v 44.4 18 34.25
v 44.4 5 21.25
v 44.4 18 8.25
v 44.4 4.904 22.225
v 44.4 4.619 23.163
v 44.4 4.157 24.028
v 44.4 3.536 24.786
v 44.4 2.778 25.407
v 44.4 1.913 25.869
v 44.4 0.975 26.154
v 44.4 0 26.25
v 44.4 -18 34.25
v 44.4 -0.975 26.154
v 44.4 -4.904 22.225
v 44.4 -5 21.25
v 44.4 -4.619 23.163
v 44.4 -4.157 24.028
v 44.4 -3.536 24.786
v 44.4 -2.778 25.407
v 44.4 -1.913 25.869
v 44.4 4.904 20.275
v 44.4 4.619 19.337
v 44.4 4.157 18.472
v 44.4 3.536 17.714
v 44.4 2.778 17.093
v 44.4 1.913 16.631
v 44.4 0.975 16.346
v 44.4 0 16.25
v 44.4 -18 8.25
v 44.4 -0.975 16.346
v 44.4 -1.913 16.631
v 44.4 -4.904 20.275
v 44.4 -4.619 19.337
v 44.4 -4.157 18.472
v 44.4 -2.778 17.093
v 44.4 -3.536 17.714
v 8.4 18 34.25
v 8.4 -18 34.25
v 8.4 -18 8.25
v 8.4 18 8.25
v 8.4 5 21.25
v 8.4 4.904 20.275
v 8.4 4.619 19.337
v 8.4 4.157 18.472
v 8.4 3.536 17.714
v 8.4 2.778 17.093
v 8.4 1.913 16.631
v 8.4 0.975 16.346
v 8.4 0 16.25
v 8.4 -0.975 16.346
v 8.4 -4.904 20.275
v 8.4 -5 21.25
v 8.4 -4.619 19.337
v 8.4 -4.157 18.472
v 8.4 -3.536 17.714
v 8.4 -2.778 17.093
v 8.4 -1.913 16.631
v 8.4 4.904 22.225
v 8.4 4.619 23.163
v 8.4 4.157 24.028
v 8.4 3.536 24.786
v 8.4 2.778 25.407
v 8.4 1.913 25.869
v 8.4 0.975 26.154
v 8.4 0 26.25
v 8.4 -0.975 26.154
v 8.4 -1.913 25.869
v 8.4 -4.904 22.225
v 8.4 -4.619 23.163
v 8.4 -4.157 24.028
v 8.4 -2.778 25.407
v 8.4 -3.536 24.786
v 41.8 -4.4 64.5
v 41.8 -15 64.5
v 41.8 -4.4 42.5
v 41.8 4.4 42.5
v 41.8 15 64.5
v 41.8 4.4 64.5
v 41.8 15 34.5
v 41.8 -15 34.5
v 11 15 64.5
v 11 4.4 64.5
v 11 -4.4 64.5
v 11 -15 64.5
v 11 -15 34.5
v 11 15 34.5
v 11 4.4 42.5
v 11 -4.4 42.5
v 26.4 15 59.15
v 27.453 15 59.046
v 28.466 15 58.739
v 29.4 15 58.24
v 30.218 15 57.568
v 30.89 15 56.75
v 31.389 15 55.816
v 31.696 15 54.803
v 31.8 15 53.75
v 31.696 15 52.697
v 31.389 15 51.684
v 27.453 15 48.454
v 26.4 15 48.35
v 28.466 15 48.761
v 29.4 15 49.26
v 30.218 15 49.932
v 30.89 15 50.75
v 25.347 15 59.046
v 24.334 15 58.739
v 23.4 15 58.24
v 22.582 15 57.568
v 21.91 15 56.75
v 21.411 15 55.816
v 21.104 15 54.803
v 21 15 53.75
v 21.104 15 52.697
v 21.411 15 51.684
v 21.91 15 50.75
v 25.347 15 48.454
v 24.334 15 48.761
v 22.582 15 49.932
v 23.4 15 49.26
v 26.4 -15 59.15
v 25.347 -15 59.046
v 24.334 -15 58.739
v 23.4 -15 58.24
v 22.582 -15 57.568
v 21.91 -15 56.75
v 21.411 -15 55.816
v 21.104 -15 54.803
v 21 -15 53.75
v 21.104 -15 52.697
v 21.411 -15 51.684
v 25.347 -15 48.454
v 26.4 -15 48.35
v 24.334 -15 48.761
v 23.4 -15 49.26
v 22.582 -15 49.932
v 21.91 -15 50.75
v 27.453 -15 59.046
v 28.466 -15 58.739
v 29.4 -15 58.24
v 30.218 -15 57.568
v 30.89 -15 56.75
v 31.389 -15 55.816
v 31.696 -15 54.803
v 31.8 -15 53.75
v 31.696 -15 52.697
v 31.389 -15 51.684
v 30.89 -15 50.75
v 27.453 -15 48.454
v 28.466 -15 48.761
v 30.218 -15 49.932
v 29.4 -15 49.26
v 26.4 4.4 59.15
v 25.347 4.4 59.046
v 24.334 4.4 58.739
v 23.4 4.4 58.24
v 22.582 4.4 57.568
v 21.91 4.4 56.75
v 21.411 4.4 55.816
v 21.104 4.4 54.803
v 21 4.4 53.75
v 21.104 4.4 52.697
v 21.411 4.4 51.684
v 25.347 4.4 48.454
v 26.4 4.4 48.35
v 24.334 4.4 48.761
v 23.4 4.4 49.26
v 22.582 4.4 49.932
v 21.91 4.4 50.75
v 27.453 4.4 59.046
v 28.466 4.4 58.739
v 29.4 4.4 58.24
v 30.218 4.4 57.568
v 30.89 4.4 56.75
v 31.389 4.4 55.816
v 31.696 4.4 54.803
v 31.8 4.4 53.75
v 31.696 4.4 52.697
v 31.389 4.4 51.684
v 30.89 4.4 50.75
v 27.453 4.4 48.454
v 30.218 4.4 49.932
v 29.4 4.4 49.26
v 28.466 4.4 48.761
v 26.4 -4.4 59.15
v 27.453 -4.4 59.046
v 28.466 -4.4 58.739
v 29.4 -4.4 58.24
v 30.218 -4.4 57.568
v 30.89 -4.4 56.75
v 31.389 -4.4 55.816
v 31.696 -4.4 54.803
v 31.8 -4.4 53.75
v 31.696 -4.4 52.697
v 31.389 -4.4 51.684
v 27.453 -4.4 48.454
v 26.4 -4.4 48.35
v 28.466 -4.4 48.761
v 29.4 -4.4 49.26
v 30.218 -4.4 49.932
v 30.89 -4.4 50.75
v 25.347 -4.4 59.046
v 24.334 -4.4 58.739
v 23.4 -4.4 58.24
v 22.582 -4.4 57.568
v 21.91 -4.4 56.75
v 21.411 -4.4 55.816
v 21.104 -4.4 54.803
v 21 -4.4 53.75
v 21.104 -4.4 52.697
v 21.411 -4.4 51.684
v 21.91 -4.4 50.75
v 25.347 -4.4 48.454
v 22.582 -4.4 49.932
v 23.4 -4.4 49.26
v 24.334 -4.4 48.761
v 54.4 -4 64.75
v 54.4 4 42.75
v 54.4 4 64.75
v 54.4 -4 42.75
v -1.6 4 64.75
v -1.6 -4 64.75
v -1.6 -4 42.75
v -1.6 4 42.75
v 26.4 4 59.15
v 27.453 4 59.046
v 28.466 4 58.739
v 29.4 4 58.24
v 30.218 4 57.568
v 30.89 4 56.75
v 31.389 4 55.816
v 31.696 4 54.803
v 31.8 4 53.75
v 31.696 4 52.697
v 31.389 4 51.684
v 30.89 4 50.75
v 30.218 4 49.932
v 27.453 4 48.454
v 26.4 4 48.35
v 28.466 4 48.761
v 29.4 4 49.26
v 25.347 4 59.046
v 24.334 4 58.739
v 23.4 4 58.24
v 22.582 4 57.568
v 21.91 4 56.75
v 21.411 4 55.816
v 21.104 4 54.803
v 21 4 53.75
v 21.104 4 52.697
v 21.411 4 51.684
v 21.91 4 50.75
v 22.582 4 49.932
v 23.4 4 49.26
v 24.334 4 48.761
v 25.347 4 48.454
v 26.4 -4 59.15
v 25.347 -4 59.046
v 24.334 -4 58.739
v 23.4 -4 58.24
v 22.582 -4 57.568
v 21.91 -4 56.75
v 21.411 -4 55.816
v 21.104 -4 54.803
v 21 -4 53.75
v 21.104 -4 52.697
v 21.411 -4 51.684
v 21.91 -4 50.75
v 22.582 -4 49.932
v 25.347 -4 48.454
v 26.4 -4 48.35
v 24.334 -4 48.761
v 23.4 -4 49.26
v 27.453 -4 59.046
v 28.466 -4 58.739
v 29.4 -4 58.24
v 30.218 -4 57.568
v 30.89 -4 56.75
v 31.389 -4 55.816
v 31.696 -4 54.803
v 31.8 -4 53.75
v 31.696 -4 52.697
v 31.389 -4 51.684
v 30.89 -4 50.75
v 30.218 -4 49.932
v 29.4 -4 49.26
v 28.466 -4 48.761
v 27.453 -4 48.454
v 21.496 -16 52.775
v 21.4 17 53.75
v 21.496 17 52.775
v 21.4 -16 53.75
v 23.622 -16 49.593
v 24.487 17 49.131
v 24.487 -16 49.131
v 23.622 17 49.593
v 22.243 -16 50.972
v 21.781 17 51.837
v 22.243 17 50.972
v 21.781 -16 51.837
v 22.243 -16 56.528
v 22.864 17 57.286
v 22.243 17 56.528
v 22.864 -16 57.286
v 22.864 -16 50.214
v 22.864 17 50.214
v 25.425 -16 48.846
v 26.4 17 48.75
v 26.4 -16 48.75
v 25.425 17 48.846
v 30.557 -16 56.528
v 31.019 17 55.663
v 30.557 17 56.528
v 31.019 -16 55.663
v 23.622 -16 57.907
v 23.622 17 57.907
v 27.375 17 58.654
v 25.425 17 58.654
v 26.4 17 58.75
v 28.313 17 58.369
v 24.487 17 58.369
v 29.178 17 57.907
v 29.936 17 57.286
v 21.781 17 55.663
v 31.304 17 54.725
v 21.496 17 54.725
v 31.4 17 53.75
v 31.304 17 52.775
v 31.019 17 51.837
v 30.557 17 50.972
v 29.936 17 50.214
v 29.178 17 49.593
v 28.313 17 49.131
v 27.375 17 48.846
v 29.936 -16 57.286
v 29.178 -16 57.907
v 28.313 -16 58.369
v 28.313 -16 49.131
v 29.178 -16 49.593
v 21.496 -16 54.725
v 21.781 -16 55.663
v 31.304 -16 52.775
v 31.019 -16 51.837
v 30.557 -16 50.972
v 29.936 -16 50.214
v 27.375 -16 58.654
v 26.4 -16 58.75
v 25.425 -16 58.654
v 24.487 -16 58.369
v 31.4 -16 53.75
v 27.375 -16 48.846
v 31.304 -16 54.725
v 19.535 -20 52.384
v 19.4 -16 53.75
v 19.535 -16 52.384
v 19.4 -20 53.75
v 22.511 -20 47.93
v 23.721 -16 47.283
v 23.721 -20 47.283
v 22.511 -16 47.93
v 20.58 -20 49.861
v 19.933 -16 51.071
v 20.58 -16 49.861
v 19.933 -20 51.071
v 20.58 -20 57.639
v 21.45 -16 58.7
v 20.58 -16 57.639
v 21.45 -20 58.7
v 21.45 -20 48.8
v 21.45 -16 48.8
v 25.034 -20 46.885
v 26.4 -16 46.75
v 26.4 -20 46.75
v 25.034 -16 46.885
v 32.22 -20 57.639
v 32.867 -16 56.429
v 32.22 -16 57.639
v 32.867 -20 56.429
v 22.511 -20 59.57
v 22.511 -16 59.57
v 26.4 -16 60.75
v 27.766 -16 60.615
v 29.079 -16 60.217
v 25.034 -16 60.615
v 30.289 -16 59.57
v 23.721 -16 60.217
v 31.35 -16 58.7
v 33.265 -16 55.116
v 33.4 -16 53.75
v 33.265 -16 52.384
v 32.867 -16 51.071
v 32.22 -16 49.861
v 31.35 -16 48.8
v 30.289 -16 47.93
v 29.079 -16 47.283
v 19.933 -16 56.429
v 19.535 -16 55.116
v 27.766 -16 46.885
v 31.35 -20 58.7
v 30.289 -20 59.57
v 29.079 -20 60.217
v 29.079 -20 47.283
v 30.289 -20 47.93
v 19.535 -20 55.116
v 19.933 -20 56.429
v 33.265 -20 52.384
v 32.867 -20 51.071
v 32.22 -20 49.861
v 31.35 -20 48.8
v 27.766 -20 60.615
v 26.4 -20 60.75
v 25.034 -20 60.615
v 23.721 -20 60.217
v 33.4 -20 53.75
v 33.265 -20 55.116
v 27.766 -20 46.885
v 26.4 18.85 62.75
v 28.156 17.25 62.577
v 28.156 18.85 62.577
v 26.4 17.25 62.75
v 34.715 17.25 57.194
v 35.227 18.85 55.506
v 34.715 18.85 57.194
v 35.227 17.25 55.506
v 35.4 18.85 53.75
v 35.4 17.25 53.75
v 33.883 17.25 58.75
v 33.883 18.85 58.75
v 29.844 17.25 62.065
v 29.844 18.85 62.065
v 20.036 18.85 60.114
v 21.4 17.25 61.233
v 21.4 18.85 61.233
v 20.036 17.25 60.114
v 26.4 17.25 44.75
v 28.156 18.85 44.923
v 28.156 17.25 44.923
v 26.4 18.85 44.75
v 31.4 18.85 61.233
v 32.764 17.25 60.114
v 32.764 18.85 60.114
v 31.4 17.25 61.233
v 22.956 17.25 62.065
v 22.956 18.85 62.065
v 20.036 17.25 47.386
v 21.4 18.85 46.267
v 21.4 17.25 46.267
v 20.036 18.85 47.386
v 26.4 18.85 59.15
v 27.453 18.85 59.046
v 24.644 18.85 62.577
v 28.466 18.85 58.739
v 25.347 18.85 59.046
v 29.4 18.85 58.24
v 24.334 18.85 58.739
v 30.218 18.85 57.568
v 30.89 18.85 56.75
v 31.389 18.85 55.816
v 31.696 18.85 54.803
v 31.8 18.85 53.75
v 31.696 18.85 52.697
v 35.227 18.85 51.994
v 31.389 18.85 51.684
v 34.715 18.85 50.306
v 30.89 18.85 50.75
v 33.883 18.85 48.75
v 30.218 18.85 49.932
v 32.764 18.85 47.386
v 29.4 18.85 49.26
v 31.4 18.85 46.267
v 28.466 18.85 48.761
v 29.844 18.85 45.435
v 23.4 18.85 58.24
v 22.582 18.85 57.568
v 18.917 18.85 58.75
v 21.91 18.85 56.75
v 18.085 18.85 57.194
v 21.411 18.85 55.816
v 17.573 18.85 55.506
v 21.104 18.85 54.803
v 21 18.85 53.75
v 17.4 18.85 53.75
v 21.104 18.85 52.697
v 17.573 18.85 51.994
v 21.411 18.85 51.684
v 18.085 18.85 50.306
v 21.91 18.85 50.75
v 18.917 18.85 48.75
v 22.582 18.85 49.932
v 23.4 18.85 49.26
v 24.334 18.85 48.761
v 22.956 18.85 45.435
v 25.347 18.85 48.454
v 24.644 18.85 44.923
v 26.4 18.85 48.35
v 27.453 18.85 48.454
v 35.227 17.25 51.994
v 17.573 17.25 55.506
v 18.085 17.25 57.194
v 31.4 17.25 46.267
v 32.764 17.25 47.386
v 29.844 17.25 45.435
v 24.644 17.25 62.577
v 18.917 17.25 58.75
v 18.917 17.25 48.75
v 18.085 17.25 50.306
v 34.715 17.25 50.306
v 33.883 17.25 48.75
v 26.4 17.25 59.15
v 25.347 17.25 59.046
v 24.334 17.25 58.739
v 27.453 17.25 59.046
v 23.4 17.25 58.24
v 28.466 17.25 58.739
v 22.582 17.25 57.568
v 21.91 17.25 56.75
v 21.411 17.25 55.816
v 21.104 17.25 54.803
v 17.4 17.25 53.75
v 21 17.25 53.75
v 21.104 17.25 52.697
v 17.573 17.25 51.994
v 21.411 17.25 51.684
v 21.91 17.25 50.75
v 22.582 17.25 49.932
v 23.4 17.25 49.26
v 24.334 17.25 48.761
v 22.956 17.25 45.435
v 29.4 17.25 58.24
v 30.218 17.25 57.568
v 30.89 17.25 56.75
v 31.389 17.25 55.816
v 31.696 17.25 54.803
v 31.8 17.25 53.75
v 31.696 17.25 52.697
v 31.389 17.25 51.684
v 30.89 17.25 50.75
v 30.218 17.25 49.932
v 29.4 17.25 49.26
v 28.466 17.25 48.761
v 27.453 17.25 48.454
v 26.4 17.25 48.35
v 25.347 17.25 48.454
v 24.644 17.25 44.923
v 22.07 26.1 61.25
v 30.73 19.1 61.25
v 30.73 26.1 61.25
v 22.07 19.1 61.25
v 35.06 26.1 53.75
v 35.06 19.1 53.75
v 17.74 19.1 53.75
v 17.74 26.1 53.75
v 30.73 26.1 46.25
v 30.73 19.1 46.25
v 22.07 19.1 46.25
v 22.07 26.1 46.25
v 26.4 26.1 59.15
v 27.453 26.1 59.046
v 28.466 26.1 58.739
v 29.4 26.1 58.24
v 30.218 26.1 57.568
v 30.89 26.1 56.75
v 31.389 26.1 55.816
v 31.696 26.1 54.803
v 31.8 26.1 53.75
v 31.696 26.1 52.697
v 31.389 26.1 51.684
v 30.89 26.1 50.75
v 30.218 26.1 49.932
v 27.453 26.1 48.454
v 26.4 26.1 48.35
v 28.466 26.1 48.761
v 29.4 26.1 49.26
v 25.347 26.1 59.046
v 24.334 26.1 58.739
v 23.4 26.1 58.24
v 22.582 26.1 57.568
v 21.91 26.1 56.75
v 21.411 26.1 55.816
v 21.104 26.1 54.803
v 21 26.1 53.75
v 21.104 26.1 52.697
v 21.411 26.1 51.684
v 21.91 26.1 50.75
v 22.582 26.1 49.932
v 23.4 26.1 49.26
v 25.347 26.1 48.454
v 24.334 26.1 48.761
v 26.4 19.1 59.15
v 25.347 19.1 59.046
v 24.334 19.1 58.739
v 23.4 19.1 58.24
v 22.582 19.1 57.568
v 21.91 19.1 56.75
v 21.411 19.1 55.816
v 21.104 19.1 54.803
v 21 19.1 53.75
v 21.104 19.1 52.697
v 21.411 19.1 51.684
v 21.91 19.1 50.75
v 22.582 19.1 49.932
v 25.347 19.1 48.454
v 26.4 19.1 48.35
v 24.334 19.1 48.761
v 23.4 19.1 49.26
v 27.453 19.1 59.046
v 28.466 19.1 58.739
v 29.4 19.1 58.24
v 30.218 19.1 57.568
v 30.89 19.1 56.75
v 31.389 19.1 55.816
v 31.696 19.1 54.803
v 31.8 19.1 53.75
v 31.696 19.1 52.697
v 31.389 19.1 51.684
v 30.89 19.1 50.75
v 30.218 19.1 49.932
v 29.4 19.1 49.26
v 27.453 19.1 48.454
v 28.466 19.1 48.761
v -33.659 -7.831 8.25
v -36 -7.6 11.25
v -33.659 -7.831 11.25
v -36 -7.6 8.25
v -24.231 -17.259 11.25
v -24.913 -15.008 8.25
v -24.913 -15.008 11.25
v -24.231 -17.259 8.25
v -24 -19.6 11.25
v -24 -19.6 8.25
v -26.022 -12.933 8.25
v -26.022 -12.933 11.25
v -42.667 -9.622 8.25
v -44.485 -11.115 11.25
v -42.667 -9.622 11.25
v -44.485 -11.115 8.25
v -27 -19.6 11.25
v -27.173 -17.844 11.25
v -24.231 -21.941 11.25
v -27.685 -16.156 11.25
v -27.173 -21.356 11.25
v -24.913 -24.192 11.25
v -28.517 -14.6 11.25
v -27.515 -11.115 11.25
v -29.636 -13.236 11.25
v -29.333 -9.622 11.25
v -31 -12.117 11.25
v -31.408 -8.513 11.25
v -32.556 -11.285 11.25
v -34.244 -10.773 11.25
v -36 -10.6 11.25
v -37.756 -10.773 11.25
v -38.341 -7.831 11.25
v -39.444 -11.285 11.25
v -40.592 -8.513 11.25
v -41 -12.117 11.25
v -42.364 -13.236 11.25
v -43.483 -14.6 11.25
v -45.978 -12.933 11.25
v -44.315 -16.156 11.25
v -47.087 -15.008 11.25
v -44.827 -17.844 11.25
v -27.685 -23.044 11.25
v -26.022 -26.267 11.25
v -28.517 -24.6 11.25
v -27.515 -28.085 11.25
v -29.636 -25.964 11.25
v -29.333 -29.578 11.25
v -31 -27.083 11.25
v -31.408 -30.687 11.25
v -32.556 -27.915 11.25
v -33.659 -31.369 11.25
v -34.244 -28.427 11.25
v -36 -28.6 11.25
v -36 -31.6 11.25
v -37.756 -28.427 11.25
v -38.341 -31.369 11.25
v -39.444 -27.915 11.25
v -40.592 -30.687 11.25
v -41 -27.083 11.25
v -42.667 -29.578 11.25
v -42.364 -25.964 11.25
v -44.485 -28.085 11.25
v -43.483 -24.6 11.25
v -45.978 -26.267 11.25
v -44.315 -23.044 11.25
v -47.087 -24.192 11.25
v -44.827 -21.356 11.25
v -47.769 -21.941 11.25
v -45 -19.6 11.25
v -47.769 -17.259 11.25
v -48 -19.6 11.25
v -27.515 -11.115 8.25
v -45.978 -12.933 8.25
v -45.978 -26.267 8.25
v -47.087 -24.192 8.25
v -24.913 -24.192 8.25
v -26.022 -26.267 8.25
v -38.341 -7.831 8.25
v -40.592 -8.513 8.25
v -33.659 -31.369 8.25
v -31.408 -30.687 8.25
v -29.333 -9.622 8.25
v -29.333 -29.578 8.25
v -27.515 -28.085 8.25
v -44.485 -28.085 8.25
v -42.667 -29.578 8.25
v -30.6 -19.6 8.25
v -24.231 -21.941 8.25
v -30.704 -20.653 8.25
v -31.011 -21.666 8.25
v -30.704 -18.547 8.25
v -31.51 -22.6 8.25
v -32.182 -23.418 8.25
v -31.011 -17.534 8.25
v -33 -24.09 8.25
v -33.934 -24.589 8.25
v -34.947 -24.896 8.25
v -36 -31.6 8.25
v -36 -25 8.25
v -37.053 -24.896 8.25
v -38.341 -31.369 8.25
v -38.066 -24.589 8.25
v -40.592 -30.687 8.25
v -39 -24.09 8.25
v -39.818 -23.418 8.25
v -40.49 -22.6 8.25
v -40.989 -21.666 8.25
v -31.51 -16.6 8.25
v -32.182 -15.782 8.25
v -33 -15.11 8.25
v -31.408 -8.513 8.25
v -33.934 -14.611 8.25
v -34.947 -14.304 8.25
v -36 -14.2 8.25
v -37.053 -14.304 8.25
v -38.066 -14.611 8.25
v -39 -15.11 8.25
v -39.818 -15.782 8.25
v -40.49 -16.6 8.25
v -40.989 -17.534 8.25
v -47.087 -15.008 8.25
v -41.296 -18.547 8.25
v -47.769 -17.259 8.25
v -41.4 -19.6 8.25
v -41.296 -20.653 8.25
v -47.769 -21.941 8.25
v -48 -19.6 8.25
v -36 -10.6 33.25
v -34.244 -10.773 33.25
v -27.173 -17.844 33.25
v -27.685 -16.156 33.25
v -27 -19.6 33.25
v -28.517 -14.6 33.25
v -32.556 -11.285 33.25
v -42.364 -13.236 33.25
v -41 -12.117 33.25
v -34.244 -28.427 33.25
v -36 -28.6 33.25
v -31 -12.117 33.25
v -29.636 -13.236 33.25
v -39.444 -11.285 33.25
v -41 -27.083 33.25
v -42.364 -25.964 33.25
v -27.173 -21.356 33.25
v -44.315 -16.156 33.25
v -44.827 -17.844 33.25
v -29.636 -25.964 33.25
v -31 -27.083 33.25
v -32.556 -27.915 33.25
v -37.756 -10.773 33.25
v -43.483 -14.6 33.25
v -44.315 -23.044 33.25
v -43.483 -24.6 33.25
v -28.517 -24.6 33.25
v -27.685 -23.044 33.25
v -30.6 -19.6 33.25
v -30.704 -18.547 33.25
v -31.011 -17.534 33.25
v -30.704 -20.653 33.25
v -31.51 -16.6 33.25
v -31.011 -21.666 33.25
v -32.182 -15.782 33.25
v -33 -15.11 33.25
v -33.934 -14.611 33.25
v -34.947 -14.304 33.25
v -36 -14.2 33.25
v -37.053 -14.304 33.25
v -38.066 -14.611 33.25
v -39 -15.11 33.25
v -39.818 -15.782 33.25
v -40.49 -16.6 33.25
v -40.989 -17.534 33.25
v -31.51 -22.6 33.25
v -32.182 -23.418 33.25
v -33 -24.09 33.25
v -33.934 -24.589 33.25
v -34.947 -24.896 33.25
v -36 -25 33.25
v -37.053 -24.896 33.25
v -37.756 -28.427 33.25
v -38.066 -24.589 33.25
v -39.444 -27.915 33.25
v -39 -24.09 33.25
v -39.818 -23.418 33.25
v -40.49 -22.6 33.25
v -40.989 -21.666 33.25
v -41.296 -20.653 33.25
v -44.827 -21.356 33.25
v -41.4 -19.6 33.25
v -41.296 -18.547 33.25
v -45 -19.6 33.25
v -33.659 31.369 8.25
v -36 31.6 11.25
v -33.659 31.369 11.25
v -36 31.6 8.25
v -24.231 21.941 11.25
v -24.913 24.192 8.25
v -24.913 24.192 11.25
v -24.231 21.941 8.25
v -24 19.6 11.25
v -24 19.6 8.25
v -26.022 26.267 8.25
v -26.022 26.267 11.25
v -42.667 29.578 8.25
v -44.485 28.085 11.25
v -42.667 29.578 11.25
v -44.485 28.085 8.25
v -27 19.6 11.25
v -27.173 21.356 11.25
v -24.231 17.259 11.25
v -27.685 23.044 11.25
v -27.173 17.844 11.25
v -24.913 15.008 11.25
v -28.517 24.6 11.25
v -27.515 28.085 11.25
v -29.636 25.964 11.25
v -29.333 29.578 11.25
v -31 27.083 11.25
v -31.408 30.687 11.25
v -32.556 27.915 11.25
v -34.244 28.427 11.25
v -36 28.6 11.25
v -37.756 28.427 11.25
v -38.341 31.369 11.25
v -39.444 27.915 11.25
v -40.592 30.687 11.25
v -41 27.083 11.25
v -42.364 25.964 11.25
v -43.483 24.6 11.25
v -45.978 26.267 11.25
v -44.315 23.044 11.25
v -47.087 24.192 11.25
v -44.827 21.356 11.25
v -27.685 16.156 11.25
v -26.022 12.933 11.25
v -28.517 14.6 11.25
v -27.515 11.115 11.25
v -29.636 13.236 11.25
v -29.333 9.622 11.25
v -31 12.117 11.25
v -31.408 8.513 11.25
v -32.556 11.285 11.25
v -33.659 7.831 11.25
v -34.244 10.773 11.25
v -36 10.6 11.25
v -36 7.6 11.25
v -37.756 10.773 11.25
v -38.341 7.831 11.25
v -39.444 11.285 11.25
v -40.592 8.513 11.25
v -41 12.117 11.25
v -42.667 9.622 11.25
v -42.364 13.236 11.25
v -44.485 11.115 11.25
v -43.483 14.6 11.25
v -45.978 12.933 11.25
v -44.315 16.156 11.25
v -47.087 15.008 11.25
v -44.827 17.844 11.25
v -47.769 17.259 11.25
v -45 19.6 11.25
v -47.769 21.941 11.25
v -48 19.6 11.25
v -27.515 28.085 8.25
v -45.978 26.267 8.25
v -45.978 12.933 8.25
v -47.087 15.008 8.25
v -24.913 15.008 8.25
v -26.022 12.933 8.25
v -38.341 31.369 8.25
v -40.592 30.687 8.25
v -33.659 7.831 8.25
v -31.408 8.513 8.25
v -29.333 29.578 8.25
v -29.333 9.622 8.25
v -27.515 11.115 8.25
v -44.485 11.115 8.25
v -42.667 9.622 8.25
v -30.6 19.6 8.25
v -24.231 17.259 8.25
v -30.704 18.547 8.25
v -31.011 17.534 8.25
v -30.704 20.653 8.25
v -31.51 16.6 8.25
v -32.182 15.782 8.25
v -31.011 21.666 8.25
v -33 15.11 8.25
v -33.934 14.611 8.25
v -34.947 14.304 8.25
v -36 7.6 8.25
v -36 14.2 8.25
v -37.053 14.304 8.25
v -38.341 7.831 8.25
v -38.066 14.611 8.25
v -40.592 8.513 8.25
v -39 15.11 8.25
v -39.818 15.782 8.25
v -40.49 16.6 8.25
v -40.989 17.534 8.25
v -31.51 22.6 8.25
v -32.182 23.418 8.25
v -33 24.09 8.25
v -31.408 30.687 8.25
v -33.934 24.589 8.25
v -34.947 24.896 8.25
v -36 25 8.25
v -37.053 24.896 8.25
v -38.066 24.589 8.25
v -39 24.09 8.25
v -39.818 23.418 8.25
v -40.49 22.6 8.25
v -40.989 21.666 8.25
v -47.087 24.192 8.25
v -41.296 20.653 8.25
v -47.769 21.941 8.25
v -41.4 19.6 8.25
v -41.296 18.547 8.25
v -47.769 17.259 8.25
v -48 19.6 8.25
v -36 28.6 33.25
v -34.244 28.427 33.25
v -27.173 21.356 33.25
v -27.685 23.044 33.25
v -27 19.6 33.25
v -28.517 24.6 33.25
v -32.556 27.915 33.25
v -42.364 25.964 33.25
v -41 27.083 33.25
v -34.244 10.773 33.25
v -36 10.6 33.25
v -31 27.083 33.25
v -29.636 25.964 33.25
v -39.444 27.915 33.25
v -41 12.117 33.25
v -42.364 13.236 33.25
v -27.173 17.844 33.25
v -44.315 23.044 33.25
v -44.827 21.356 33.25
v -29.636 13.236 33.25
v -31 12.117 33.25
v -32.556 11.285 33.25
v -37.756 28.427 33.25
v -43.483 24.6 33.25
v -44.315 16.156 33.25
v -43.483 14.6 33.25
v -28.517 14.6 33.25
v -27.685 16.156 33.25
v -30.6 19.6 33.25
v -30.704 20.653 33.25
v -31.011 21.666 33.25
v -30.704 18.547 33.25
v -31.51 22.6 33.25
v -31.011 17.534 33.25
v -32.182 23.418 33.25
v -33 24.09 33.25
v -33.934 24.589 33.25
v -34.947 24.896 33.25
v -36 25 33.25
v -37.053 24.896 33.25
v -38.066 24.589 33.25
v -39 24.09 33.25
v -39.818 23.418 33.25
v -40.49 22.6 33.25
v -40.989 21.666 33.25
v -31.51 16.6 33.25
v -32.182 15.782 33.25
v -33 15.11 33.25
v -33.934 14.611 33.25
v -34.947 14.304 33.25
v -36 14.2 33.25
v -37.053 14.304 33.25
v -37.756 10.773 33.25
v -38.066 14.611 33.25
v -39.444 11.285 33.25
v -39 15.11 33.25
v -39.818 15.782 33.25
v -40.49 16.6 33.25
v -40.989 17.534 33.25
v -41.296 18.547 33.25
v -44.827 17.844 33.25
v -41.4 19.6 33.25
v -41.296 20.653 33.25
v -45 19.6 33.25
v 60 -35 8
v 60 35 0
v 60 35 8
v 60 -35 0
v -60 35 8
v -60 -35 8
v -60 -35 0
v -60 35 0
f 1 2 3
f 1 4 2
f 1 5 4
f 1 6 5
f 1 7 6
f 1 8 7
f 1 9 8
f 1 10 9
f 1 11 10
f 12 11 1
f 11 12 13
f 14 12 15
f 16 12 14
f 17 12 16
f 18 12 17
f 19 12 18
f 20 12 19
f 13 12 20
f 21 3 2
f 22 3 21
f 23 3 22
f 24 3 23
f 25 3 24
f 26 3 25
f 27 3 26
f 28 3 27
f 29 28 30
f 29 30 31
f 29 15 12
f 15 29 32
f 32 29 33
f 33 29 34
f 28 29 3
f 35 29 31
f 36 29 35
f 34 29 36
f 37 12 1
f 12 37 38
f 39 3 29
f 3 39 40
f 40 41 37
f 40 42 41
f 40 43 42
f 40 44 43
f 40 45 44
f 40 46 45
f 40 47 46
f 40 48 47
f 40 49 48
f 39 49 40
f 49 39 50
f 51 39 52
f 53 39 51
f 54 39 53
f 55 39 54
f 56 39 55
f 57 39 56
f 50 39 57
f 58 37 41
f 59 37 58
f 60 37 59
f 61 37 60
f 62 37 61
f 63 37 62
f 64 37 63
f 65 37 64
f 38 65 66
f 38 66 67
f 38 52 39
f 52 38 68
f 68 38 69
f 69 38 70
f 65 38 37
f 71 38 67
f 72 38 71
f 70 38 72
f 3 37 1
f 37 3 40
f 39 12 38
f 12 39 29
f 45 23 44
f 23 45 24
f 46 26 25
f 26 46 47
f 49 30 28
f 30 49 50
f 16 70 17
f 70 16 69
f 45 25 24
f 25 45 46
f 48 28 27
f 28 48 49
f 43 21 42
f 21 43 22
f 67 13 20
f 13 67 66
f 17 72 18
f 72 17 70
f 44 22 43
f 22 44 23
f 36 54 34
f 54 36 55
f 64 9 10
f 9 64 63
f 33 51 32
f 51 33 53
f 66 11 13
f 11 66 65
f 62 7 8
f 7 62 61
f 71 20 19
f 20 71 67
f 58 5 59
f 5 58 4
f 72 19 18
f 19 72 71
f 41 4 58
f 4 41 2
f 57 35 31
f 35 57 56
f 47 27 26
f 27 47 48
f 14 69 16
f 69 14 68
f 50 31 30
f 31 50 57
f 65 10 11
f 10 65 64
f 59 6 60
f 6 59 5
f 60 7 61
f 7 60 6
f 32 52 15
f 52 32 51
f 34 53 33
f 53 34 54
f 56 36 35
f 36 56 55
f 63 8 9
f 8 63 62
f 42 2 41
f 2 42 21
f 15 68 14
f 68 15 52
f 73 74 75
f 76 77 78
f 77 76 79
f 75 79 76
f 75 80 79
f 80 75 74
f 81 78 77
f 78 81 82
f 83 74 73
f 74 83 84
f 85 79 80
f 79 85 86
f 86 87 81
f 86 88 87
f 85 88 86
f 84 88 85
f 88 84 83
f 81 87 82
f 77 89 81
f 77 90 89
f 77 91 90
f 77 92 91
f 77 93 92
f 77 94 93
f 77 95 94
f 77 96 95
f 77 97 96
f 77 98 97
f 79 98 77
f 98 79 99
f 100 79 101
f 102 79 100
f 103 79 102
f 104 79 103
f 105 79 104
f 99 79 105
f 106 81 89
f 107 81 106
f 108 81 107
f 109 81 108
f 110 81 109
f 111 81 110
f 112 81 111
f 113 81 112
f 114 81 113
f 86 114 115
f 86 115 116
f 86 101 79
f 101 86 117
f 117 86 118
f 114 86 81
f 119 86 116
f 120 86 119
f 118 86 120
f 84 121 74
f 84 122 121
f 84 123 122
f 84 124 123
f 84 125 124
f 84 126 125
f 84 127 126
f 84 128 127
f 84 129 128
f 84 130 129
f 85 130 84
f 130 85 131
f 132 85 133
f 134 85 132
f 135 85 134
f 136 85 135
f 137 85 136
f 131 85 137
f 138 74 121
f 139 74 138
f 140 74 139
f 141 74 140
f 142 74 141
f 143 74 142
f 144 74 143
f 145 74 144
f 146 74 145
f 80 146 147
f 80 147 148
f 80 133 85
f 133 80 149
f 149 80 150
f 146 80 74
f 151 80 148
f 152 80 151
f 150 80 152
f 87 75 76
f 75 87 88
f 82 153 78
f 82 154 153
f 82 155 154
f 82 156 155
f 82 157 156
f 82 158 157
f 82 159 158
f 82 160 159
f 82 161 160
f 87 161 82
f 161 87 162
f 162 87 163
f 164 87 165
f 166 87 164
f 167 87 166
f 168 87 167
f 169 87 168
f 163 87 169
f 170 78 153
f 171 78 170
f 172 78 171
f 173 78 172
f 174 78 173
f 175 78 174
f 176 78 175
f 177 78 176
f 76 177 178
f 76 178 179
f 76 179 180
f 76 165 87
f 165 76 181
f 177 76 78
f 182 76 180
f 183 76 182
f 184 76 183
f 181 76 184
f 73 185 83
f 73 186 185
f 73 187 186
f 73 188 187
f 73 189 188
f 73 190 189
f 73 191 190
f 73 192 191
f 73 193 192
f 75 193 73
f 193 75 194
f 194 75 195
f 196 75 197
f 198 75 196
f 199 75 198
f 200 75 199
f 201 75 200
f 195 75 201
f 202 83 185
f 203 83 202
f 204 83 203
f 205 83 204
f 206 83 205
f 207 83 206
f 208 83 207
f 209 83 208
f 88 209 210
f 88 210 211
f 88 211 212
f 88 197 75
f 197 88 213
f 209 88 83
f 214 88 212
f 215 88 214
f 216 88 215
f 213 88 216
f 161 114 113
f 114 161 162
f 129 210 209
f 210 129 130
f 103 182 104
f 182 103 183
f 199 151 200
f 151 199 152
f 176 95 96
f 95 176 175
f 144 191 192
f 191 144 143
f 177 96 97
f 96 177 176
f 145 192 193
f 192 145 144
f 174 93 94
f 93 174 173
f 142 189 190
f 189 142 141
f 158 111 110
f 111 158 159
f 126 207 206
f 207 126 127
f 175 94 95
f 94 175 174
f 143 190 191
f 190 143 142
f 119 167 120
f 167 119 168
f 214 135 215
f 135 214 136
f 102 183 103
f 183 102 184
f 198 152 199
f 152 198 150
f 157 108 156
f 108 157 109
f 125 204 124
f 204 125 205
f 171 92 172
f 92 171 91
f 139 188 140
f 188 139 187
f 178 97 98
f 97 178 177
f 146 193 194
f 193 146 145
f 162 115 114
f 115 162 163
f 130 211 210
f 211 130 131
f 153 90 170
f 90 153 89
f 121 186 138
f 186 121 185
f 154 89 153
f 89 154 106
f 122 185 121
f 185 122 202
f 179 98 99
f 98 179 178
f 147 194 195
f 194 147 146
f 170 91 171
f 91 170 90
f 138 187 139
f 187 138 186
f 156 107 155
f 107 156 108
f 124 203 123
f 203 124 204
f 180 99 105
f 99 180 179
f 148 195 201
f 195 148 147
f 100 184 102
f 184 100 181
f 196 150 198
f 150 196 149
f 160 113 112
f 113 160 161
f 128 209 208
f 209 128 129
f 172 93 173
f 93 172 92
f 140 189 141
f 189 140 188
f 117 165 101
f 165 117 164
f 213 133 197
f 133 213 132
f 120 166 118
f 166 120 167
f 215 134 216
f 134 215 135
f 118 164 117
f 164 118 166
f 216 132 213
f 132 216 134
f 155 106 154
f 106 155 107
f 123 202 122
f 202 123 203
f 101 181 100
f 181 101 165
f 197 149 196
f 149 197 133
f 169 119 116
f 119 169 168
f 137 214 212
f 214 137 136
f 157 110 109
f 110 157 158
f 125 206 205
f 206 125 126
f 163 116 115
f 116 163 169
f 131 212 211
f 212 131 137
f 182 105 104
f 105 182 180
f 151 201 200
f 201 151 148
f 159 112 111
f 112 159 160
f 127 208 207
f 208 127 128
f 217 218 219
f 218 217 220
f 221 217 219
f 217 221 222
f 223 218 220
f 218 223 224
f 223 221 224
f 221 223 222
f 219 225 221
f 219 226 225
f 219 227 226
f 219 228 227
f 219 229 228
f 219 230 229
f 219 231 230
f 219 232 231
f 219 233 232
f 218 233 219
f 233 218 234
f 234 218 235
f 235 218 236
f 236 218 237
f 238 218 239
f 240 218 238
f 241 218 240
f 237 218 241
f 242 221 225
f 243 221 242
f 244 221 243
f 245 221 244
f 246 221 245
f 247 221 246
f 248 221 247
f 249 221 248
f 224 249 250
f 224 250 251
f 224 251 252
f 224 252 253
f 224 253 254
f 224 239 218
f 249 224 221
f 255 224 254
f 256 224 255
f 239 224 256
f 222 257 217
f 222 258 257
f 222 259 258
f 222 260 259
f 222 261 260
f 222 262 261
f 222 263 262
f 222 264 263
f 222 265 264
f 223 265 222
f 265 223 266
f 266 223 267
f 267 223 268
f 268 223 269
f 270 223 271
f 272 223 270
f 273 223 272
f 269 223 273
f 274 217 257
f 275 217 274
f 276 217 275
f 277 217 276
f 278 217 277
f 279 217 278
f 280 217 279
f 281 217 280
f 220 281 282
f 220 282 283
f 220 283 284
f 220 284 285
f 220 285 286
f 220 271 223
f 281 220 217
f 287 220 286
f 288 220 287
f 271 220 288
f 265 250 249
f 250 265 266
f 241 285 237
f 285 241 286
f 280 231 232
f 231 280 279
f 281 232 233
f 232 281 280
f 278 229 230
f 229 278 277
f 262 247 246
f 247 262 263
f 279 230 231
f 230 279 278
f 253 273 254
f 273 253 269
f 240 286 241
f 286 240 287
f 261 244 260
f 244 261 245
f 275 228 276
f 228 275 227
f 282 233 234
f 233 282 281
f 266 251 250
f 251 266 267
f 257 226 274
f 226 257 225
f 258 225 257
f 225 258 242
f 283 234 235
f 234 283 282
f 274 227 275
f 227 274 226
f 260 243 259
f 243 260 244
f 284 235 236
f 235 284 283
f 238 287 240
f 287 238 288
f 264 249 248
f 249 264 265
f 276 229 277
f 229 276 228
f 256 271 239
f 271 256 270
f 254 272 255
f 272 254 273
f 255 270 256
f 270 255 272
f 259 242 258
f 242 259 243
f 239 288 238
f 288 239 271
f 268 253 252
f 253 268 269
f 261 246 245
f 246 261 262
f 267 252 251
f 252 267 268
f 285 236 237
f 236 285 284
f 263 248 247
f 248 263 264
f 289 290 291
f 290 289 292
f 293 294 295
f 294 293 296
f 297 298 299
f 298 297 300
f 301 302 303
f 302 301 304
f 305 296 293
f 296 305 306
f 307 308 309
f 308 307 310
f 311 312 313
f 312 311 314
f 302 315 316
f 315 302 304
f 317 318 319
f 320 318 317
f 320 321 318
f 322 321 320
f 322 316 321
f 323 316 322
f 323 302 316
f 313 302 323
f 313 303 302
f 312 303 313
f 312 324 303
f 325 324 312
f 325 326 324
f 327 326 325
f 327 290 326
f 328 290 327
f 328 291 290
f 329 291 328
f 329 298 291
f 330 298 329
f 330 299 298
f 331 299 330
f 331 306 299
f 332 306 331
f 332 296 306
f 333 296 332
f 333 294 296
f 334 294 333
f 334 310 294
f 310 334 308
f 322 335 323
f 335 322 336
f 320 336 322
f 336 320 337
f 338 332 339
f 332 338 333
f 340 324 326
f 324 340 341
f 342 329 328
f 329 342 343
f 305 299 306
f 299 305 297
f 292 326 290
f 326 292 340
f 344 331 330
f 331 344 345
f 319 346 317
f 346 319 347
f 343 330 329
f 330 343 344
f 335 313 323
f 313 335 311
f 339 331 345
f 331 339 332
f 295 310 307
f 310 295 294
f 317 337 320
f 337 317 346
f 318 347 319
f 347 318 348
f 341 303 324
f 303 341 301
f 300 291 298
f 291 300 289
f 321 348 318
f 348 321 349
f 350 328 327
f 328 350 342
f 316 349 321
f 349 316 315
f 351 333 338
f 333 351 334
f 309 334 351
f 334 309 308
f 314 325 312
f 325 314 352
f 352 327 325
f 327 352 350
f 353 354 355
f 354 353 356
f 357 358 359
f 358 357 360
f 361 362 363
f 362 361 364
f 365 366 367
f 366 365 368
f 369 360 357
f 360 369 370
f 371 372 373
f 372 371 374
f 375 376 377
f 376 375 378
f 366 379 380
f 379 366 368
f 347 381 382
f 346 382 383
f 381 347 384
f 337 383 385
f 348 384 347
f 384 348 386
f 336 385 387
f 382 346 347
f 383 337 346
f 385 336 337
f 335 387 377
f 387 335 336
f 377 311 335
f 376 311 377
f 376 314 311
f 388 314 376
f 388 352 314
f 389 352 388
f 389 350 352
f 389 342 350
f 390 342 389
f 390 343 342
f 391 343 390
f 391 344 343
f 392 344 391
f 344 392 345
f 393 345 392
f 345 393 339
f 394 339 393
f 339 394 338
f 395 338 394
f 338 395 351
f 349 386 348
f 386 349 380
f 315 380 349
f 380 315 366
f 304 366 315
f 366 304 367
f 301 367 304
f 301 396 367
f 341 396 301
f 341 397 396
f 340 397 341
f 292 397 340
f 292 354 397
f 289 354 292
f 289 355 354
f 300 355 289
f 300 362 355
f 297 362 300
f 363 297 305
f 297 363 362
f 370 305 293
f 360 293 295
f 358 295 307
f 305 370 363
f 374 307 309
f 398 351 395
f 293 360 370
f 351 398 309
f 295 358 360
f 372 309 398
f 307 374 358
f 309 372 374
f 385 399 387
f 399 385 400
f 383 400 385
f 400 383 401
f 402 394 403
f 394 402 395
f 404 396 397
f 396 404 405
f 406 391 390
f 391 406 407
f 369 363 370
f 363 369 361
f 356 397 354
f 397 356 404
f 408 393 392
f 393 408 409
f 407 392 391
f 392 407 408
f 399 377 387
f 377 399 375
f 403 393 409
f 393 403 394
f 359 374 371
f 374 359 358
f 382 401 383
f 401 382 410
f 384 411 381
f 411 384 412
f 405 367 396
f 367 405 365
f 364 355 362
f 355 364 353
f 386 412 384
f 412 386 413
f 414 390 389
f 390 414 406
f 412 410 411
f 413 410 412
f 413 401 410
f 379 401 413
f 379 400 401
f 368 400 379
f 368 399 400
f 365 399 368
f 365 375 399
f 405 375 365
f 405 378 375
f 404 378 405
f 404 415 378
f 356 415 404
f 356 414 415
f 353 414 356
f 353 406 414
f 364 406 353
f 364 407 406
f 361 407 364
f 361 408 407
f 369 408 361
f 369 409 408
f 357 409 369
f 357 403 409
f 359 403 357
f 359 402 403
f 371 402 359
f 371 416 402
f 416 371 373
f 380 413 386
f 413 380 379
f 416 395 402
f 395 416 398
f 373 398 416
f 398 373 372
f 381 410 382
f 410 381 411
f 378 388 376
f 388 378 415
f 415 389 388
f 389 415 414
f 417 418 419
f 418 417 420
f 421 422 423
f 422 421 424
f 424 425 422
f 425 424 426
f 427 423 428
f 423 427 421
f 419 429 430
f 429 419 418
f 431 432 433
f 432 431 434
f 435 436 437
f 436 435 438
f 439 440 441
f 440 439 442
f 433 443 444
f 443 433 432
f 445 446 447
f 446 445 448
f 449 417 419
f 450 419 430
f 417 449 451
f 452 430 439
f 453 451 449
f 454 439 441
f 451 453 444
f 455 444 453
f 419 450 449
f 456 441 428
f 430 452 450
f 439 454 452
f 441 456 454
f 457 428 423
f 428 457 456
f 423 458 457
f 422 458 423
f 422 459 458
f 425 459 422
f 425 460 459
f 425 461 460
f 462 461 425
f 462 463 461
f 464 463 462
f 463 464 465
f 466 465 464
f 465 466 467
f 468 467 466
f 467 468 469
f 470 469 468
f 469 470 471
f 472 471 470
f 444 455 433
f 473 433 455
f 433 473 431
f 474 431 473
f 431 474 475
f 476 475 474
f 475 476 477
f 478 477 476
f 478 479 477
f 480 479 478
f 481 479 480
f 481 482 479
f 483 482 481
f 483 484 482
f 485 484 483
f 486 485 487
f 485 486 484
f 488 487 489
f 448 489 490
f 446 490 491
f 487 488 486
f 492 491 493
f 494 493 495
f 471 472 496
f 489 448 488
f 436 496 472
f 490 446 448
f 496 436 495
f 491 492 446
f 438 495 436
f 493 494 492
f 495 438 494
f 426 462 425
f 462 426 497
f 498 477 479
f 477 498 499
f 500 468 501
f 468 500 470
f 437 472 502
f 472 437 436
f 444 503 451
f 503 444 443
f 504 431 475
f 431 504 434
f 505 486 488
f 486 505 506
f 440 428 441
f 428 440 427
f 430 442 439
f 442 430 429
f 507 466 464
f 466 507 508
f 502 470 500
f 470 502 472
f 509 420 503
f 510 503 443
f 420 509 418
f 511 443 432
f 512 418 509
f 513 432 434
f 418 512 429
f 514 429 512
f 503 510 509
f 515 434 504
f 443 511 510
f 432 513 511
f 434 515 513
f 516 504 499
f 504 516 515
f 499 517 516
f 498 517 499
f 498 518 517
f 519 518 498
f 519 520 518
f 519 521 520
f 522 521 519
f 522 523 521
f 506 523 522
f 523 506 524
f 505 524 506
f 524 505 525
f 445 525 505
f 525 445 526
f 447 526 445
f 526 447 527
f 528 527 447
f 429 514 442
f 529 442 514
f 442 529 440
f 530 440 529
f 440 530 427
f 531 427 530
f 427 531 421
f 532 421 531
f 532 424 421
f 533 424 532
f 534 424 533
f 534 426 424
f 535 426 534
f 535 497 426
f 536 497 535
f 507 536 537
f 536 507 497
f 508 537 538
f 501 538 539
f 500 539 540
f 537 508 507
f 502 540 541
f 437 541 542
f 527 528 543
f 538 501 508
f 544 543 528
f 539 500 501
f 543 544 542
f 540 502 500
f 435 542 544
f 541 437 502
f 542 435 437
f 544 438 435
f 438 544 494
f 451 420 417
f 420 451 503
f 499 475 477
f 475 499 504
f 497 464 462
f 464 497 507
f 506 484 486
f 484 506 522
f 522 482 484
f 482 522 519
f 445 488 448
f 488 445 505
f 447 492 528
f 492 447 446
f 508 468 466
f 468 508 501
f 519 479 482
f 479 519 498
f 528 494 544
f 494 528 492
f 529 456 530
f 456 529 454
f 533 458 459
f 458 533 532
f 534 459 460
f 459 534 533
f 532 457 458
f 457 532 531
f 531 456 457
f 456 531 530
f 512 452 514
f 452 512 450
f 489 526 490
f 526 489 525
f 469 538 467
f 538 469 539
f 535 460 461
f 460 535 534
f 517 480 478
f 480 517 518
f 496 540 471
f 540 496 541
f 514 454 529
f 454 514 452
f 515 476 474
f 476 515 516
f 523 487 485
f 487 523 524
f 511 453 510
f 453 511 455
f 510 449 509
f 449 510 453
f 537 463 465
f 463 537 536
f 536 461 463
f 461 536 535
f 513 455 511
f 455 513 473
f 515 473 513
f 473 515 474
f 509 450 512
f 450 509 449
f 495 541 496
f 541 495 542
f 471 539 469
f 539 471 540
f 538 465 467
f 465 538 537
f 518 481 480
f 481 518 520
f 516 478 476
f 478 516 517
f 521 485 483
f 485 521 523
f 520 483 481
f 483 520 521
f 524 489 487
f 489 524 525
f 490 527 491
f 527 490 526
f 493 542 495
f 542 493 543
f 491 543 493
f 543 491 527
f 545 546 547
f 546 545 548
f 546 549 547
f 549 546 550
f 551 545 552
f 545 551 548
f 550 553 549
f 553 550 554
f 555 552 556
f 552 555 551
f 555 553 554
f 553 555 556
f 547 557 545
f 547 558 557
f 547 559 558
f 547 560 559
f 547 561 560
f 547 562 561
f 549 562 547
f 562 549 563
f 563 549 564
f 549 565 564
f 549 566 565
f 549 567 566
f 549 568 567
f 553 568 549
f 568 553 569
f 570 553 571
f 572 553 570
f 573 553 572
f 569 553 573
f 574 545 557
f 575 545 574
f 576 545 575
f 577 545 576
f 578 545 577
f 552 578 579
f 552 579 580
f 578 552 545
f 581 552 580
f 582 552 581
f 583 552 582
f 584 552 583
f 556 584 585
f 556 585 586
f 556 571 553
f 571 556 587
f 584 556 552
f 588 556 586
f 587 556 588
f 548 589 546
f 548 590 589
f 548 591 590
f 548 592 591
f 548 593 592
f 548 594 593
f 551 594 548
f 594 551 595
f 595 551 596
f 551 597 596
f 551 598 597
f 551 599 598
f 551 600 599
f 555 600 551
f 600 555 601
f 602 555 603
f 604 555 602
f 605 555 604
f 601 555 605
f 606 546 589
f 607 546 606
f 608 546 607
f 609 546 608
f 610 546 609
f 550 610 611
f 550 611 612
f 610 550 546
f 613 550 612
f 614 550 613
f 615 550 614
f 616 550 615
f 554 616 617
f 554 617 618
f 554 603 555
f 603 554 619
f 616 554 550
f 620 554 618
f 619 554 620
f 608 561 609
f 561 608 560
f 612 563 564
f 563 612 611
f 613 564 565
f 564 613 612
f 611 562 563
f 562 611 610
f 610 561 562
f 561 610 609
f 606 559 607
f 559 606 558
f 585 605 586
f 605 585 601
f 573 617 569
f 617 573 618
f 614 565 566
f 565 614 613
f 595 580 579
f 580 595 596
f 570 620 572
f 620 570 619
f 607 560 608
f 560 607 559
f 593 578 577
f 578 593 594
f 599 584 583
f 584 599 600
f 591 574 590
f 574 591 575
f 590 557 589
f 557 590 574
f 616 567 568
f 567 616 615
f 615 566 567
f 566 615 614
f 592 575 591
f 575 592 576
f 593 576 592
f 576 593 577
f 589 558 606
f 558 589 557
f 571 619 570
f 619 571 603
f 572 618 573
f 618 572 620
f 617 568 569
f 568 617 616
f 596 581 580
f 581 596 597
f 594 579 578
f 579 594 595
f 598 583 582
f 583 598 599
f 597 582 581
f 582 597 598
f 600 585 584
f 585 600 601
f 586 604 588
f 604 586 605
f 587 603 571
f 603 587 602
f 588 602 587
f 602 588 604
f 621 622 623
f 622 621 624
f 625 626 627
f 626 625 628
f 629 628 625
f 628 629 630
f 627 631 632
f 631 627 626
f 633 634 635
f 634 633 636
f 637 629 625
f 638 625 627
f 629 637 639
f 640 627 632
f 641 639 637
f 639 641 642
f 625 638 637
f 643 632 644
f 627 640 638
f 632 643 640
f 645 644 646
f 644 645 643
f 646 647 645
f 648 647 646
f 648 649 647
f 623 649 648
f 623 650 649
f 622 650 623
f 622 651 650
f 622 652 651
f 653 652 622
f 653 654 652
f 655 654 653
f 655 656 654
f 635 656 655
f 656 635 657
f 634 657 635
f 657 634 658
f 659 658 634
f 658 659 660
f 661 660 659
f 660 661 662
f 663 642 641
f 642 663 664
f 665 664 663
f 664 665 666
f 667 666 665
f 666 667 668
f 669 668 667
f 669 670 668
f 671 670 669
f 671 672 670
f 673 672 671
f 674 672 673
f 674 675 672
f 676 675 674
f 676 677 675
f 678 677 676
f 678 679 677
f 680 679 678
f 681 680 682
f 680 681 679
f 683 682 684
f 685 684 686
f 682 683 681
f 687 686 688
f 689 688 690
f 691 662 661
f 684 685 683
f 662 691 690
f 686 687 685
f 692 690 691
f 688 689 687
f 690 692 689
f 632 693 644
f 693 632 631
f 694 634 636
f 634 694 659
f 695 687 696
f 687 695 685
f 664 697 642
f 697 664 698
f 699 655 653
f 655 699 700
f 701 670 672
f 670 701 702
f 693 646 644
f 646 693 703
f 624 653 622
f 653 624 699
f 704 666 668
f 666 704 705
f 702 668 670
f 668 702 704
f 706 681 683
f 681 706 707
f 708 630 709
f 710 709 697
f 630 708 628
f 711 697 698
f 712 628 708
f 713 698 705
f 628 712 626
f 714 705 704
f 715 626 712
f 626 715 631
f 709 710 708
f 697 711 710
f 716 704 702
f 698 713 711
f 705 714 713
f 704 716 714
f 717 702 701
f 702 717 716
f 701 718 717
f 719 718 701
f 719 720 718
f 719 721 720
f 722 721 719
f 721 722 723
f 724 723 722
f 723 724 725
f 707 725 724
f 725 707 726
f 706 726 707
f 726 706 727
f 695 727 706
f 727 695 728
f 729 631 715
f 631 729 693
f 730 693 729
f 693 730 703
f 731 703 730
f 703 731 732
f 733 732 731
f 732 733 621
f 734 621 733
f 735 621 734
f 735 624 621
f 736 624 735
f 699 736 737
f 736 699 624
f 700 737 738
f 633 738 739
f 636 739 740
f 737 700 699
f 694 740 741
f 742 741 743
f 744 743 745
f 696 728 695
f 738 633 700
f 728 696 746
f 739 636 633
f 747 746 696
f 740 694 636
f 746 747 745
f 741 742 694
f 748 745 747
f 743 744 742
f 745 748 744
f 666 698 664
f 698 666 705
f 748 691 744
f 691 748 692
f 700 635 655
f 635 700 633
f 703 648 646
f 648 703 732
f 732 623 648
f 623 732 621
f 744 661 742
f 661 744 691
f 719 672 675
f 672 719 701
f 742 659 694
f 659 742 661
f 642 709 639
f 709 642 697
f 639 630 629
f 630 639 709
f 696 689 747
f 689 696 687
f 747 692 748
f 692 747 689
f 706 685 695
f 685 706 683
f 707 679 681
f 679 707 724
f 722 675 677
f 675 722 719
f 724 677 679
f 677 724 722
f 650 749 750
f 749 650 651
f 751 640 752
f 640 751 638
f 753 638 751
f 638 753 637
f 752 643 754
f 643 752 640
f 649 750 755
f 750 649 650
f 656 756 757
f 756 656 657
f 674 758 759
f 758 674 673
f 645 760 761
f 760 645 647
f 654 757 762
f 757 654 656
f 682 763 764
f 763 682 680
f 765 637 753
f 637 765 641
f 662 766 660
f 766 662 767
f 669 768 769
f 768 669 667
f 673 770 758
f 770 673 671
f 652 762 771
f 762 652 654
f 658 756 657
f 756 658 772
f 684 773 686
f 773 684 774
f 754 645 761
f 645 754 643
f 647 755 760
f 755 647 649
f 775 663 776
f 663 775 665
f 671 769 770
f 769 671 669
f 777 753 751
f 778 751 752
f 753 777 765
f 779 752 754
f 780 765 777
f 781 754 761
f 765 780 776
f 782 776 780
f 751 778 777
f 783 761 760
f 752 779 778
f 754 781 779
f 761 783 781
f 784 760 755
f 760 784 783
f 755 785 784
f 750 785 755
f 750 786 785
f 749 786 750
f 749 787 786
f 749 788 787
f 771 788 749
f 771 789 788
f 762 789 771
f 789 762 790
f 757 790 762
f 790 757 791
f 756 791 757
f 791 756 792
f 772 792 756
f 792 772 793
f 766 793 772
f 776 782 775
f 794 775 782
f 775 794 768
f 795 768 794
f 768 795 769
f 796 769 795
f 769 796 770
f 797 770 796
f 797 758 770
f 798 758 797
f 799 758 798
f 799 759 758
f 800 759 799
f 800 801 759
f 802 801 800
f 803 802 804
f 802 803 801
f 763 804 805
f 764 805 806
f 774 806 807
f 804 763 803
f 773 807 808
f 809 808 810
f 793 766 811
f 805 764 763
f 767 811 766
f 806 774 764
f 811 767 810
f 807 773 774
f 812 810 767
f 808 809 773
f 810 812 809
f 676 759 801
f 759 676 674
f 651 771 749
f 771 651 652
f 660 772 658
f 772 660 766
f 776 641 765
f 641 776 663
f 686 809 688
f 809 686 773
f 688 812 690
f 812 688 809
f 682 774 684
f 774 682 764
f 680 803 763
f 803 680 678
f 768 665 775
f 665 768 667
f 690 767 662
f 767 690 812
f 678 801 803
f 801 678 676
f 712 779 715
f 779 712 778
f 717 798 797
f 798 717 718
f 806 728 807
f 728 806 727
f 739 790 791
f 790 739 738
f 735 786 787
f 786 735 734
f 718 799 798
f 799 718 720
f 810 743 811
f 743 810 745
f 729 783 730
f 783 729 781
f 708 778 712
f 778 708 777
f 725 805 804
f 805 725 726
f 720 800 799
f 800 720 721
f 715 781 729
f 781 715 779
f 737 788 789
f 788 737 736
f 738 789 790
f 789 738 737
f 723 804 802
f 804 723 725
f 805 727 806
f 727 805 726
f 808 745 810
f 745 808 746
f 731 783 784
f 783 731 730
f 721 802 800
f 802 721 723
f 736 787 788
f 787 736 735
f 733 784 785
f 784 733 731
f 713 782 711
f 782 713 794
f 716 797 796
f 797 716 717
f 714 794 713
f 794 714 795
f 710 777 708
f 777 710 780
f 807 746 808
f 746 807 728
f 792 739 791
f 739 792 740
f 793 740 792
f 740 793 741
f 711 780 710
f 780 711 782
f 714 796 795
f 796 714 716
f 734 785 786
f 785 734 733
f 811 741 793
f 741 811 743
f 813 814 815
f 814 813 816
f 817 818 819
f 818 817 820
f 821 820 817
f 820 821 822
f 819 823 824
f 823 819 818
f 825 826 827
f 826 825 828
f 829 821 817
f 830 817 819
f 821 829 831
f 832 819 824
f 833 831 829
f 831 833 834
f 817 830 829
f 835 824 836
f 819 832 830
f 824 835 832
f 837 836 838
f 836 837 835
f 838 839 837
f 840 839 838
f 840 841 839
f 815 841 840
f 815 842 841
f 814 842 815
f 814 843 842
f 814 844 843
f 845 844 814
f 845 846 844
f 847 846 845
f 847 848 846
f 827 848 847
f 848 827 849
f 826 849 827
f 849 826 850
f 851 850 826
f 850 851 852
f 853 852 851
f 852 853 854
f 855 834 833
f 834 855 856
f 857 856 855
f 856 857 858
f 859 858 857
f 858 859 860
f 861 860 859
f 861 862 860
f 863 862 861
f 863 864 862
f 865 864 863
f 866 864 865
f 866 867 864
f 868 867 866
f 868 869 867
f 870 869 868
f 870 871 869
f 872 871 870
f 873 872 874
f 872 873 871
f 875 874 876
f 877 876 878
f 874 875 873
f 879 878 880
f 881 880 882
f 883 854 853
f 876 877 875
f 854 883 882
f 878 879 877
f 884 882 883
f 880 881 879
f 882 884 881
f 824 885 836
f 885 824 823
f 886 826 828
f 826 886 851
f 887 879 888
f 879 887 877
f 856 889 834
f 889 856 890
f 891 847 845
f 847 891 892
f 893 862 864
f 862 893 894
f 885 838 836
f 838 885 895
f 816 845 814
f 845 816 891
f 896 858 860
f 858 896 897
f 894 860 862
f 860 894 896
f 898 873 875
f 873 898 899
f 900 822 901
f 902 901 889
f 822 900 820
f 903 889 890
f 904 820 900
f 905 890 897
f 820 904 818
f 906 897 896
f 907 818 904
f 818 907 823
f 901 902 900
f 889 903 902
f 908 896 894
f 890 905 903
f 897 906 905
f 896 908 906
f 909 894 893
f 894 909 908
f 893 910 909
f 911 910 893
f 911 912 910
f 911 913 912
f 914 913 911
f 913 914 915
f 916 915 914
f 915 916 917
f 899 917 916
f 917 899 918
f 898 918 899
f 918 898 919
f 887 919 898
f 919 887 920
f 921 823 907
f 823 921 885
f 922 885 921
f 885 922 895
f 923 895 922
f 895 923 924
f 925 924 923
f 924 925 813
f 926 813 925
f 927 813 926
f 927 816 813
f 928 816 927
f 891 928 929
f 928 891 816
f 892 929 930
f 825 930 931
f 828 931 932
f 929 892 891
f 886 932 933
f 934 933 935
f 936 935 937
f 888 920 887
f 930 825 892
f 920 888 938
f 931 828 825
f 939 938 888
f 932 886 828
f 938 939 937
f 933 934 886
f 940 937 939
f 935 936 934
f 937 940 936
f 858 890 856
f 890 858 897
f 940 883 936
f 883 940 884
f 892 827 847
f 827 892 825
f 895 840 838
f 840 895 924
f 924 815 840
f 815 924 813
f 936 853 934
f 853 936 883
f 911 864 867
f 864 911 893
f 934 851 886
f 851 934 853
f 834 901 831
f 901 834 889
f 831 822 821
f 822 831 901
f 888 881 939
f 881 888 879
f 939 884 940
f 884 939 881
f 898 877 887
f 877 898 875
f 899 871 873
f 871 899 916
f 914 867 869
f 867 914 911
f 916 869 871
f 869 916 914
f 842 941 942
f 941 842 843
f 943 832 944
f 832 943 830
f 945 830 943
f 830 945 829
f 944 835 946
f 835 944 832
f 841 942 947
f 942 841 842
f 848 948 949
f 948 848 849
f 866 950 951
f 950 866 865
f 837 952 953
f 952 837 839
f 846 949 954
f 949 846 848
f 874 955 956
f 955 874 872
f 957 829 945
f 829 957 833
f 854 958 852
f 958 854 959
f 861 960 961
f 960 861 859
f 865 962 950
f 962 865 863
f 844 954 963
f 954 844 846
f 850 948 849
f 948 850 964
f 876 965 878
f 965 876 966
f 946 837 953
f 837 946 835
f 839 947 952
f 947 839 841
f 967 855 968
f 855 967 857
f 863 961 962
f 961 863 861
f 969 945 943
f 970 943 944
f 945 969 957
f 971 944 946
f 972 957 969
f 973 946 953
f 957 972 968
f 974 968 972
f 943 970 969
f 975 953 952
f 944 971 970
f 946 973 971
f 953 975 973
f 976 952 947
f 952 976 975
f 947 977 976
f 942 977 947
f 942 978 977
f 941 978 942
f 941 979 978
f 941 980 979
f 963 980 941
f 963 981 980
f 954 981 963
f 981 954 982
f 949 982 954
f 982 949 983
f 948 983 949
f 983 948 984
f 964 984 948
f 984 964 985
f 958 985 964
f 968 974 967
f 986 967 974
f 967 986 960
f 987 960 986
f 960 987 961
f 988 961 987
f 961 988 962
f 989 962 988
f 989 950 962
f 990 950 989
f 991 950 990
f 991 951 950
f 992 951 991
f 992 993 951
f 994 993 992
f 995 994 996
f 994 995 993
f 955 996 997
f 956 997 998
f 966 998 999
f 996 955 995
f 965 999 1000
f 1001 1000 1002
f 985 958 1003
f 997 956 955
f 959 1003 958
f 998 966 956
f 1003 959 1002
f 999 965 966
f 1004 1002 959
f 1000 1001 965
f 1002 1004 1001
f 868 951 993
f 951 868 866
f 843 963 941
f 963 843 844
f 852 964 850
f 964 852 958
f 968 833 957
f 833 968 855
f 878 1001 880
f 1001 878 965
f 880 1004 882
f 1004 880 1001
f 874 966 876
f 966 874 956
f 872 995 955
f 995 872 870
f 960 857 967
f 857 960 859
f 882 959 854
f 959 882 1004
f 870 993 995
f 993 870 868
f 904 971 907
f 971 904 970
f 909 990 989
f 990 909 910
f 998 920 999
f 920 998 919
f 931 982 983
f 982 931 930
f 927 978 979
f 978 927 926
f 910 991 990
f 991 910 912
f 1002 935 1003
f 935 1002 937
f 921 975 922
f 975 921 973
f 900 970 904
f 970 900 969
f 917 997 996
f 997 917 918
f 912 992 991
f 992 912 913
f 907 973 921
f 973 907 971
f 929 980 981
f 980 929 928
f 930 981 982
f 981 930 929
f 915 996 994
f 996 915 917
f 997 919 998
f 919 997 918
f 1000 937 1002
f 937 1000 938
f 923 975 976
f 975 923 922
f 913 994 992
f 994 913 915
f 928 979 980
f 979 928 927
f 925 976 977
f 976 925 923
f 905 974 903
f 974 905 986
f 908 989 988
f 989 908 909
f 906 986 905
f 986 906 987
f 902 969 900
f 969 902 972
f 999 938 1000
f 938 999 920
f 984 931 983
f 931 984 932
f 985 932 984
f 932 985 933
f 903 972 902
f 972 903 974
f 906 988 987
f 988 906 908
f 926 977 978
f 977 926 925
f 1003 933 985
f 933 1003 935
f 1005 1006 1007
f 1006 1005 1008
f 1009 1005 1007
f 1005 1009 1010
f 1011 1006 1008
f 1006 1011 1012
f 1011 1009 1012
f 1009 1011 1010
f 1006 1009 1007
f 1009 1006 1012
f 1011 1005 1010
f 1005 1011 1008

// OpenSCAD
$fn = 32;

// ------------------------------------------------------------------------
// Indexing jig: plate 120 x 70 mm, pin d10
// Every part is its own module, assembly() places every instance.
// ------------------------------------------------------------------------

// --- part 1 ---
module jig_plate() {
  difference() {
    translate([-60, -35, 0]) cube([120, 70, 8]);
  }
}

// --- part 2 ---
module locator_block() {
  difference() {
    translate([-18, -18, 0]) cube([36, 36, 26]);
    translate([0, 0, 13]) rotate([0, 90, 0]) cylinder(h = 38, d = 10, center = true);
  }
}

// --- part 3 ---
module index_fork() {
  difference() {
    translate([-15.4, -15, 0]) cube([30.8, 30, 30]);
    translate([-16.4, -4.4, 8]) cube([32.8, 8.8, 23]);
    translate([0, 0, 19.25]) rotate([90, 0, 0]) cylinder(h = 32, d = 10.8, center = true);
  }
}

// --- part 4 ---
module index_arm() {
  difference() {
    translate([-28, -4, 0]) cube([56, 8, 22]);
    translate([0, 0, 11]) rotate([90, 0, 0]) cylinder(h = 10, d = 10.8, center = true);
  }
}

// --- part 5 ---
module index_pin() {
  rotate([0, 90, 0]) cylinder(h = 34, d = 10, center = true);
  translate([-20, 0, 0]) rotate([0, 90, 0]) cylinder(h = 4, d = 14);
}

// --- part 6 ---
module pin_washer() {
  difference() {
      translate([0, 0, 0]) cylinder(h = 1.6, d = 18);
      translate([0, 0, -1]) cylinder(h = 3.6, d = 10.8);
    }
}

// --- part 7 ---
module lock_nut() {
  difference() {
    linear_extrude(height = 7) polygon(points = [[8.66, 0], [4.33, 7.5], [-4.33, 7.5], [-8.66, 0], [-4.33, -7.5], [4.33, -7.5]]);
    translate([0, 0, -1]) cylinder(h = 9, d = 10.8);
  }
}

// --- part 8 ---
module guide_bush_a() {
  difference() {
    union() {
      cylinder(h = 3, d = 24);
      translate([0, 0, 3]) cylinder(h = 22, d = 18);
    }
    translate([0, 0, -1]) cylinder(h = 27, d = 10.8);
  }
}

// --- part 9 ---
module guide_bush_b() {
  difference() {
    union() {
      cylinder(h = 3, d = 24);
      translate([0, 0, 3]) cylinder(h = 22, d = 18);
    }
    translate([0, 0, -1]) cylinder(h = 27, d = 10.8);
  }
}

// --- assembly ---
module assembly() {
  color([0.80, 0.24, 0.20]) translate([0, 0, 0]) rotate([0, 0, 0]) jig_plate();
  color([0.20, 0.45, 0.75]) translate([26.4, 0, 8.25]) rotate([0, 0, 0]) locator_block();
  color([0.25, 0.62, 0.32]) translate([26.4, 0, 34.5]) rotate([0, 0, 0]) index_fork();
  color([0.92, 0.70, 0.18]) translate([26.4, 0, 42.75]) rotate([0, 0, 0]) index_arm();
  color([0.58, 0.35, 0.70]) translate([26.4, 0, 53.75]) rotate([0, 0, 90]) index_pin();
  color([0.16, 0.66, 0.66]) translate([26.4, 18.85, 53.75]) rotate([90, 0, 0]) pin_washer();
  color([0.85, 0.48, 0.18]) translate([26.4, 26.1, 53.75]) rotate([90, 0, 0]) lock_nut();
  color([0.55, 0.60, 0.65]) translate([-36, -19.6, 8.25]) rotate([0, 0, 0]) guide_bush_a();
  color([0.75, 0.30, 0.55]) translate([-36, 19.6, 8.25]) rotate([0, 0, 0]) guide_bush_b();
}

assembly();
